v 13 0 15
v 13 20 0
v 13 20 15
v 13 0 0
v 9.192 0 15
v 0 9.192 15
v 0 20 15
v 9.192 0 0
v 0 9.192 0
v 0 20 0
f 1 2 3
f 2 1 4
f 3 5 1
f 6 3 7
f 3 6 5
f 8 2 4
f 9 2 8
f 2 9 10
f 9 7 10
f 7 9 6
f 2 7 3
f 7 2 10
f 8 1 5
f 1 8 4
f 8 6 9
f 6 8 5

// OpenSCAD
width = 13;
depth = 15;
ridge = 3;
length = 20;
corner = 13;
screw = 3;


difference(){
    cube([width,length,depth]);
    
    translate([0,0,depth/2]) rotate([0,0,45]) cube([corner,corner,depth+1],center=true);
    //translate([length,length/2,depth]) rotate([0,45,0]) cube([corner,length+1,corner],center=true);
    //translate([length/2,length,depth]) rotate([45,0,0]) cube([length+1,corner,corner],center=true);
    //translate([10,10,-1]) cylinder(d=screw,h=depth+2,$fn=30);
}
